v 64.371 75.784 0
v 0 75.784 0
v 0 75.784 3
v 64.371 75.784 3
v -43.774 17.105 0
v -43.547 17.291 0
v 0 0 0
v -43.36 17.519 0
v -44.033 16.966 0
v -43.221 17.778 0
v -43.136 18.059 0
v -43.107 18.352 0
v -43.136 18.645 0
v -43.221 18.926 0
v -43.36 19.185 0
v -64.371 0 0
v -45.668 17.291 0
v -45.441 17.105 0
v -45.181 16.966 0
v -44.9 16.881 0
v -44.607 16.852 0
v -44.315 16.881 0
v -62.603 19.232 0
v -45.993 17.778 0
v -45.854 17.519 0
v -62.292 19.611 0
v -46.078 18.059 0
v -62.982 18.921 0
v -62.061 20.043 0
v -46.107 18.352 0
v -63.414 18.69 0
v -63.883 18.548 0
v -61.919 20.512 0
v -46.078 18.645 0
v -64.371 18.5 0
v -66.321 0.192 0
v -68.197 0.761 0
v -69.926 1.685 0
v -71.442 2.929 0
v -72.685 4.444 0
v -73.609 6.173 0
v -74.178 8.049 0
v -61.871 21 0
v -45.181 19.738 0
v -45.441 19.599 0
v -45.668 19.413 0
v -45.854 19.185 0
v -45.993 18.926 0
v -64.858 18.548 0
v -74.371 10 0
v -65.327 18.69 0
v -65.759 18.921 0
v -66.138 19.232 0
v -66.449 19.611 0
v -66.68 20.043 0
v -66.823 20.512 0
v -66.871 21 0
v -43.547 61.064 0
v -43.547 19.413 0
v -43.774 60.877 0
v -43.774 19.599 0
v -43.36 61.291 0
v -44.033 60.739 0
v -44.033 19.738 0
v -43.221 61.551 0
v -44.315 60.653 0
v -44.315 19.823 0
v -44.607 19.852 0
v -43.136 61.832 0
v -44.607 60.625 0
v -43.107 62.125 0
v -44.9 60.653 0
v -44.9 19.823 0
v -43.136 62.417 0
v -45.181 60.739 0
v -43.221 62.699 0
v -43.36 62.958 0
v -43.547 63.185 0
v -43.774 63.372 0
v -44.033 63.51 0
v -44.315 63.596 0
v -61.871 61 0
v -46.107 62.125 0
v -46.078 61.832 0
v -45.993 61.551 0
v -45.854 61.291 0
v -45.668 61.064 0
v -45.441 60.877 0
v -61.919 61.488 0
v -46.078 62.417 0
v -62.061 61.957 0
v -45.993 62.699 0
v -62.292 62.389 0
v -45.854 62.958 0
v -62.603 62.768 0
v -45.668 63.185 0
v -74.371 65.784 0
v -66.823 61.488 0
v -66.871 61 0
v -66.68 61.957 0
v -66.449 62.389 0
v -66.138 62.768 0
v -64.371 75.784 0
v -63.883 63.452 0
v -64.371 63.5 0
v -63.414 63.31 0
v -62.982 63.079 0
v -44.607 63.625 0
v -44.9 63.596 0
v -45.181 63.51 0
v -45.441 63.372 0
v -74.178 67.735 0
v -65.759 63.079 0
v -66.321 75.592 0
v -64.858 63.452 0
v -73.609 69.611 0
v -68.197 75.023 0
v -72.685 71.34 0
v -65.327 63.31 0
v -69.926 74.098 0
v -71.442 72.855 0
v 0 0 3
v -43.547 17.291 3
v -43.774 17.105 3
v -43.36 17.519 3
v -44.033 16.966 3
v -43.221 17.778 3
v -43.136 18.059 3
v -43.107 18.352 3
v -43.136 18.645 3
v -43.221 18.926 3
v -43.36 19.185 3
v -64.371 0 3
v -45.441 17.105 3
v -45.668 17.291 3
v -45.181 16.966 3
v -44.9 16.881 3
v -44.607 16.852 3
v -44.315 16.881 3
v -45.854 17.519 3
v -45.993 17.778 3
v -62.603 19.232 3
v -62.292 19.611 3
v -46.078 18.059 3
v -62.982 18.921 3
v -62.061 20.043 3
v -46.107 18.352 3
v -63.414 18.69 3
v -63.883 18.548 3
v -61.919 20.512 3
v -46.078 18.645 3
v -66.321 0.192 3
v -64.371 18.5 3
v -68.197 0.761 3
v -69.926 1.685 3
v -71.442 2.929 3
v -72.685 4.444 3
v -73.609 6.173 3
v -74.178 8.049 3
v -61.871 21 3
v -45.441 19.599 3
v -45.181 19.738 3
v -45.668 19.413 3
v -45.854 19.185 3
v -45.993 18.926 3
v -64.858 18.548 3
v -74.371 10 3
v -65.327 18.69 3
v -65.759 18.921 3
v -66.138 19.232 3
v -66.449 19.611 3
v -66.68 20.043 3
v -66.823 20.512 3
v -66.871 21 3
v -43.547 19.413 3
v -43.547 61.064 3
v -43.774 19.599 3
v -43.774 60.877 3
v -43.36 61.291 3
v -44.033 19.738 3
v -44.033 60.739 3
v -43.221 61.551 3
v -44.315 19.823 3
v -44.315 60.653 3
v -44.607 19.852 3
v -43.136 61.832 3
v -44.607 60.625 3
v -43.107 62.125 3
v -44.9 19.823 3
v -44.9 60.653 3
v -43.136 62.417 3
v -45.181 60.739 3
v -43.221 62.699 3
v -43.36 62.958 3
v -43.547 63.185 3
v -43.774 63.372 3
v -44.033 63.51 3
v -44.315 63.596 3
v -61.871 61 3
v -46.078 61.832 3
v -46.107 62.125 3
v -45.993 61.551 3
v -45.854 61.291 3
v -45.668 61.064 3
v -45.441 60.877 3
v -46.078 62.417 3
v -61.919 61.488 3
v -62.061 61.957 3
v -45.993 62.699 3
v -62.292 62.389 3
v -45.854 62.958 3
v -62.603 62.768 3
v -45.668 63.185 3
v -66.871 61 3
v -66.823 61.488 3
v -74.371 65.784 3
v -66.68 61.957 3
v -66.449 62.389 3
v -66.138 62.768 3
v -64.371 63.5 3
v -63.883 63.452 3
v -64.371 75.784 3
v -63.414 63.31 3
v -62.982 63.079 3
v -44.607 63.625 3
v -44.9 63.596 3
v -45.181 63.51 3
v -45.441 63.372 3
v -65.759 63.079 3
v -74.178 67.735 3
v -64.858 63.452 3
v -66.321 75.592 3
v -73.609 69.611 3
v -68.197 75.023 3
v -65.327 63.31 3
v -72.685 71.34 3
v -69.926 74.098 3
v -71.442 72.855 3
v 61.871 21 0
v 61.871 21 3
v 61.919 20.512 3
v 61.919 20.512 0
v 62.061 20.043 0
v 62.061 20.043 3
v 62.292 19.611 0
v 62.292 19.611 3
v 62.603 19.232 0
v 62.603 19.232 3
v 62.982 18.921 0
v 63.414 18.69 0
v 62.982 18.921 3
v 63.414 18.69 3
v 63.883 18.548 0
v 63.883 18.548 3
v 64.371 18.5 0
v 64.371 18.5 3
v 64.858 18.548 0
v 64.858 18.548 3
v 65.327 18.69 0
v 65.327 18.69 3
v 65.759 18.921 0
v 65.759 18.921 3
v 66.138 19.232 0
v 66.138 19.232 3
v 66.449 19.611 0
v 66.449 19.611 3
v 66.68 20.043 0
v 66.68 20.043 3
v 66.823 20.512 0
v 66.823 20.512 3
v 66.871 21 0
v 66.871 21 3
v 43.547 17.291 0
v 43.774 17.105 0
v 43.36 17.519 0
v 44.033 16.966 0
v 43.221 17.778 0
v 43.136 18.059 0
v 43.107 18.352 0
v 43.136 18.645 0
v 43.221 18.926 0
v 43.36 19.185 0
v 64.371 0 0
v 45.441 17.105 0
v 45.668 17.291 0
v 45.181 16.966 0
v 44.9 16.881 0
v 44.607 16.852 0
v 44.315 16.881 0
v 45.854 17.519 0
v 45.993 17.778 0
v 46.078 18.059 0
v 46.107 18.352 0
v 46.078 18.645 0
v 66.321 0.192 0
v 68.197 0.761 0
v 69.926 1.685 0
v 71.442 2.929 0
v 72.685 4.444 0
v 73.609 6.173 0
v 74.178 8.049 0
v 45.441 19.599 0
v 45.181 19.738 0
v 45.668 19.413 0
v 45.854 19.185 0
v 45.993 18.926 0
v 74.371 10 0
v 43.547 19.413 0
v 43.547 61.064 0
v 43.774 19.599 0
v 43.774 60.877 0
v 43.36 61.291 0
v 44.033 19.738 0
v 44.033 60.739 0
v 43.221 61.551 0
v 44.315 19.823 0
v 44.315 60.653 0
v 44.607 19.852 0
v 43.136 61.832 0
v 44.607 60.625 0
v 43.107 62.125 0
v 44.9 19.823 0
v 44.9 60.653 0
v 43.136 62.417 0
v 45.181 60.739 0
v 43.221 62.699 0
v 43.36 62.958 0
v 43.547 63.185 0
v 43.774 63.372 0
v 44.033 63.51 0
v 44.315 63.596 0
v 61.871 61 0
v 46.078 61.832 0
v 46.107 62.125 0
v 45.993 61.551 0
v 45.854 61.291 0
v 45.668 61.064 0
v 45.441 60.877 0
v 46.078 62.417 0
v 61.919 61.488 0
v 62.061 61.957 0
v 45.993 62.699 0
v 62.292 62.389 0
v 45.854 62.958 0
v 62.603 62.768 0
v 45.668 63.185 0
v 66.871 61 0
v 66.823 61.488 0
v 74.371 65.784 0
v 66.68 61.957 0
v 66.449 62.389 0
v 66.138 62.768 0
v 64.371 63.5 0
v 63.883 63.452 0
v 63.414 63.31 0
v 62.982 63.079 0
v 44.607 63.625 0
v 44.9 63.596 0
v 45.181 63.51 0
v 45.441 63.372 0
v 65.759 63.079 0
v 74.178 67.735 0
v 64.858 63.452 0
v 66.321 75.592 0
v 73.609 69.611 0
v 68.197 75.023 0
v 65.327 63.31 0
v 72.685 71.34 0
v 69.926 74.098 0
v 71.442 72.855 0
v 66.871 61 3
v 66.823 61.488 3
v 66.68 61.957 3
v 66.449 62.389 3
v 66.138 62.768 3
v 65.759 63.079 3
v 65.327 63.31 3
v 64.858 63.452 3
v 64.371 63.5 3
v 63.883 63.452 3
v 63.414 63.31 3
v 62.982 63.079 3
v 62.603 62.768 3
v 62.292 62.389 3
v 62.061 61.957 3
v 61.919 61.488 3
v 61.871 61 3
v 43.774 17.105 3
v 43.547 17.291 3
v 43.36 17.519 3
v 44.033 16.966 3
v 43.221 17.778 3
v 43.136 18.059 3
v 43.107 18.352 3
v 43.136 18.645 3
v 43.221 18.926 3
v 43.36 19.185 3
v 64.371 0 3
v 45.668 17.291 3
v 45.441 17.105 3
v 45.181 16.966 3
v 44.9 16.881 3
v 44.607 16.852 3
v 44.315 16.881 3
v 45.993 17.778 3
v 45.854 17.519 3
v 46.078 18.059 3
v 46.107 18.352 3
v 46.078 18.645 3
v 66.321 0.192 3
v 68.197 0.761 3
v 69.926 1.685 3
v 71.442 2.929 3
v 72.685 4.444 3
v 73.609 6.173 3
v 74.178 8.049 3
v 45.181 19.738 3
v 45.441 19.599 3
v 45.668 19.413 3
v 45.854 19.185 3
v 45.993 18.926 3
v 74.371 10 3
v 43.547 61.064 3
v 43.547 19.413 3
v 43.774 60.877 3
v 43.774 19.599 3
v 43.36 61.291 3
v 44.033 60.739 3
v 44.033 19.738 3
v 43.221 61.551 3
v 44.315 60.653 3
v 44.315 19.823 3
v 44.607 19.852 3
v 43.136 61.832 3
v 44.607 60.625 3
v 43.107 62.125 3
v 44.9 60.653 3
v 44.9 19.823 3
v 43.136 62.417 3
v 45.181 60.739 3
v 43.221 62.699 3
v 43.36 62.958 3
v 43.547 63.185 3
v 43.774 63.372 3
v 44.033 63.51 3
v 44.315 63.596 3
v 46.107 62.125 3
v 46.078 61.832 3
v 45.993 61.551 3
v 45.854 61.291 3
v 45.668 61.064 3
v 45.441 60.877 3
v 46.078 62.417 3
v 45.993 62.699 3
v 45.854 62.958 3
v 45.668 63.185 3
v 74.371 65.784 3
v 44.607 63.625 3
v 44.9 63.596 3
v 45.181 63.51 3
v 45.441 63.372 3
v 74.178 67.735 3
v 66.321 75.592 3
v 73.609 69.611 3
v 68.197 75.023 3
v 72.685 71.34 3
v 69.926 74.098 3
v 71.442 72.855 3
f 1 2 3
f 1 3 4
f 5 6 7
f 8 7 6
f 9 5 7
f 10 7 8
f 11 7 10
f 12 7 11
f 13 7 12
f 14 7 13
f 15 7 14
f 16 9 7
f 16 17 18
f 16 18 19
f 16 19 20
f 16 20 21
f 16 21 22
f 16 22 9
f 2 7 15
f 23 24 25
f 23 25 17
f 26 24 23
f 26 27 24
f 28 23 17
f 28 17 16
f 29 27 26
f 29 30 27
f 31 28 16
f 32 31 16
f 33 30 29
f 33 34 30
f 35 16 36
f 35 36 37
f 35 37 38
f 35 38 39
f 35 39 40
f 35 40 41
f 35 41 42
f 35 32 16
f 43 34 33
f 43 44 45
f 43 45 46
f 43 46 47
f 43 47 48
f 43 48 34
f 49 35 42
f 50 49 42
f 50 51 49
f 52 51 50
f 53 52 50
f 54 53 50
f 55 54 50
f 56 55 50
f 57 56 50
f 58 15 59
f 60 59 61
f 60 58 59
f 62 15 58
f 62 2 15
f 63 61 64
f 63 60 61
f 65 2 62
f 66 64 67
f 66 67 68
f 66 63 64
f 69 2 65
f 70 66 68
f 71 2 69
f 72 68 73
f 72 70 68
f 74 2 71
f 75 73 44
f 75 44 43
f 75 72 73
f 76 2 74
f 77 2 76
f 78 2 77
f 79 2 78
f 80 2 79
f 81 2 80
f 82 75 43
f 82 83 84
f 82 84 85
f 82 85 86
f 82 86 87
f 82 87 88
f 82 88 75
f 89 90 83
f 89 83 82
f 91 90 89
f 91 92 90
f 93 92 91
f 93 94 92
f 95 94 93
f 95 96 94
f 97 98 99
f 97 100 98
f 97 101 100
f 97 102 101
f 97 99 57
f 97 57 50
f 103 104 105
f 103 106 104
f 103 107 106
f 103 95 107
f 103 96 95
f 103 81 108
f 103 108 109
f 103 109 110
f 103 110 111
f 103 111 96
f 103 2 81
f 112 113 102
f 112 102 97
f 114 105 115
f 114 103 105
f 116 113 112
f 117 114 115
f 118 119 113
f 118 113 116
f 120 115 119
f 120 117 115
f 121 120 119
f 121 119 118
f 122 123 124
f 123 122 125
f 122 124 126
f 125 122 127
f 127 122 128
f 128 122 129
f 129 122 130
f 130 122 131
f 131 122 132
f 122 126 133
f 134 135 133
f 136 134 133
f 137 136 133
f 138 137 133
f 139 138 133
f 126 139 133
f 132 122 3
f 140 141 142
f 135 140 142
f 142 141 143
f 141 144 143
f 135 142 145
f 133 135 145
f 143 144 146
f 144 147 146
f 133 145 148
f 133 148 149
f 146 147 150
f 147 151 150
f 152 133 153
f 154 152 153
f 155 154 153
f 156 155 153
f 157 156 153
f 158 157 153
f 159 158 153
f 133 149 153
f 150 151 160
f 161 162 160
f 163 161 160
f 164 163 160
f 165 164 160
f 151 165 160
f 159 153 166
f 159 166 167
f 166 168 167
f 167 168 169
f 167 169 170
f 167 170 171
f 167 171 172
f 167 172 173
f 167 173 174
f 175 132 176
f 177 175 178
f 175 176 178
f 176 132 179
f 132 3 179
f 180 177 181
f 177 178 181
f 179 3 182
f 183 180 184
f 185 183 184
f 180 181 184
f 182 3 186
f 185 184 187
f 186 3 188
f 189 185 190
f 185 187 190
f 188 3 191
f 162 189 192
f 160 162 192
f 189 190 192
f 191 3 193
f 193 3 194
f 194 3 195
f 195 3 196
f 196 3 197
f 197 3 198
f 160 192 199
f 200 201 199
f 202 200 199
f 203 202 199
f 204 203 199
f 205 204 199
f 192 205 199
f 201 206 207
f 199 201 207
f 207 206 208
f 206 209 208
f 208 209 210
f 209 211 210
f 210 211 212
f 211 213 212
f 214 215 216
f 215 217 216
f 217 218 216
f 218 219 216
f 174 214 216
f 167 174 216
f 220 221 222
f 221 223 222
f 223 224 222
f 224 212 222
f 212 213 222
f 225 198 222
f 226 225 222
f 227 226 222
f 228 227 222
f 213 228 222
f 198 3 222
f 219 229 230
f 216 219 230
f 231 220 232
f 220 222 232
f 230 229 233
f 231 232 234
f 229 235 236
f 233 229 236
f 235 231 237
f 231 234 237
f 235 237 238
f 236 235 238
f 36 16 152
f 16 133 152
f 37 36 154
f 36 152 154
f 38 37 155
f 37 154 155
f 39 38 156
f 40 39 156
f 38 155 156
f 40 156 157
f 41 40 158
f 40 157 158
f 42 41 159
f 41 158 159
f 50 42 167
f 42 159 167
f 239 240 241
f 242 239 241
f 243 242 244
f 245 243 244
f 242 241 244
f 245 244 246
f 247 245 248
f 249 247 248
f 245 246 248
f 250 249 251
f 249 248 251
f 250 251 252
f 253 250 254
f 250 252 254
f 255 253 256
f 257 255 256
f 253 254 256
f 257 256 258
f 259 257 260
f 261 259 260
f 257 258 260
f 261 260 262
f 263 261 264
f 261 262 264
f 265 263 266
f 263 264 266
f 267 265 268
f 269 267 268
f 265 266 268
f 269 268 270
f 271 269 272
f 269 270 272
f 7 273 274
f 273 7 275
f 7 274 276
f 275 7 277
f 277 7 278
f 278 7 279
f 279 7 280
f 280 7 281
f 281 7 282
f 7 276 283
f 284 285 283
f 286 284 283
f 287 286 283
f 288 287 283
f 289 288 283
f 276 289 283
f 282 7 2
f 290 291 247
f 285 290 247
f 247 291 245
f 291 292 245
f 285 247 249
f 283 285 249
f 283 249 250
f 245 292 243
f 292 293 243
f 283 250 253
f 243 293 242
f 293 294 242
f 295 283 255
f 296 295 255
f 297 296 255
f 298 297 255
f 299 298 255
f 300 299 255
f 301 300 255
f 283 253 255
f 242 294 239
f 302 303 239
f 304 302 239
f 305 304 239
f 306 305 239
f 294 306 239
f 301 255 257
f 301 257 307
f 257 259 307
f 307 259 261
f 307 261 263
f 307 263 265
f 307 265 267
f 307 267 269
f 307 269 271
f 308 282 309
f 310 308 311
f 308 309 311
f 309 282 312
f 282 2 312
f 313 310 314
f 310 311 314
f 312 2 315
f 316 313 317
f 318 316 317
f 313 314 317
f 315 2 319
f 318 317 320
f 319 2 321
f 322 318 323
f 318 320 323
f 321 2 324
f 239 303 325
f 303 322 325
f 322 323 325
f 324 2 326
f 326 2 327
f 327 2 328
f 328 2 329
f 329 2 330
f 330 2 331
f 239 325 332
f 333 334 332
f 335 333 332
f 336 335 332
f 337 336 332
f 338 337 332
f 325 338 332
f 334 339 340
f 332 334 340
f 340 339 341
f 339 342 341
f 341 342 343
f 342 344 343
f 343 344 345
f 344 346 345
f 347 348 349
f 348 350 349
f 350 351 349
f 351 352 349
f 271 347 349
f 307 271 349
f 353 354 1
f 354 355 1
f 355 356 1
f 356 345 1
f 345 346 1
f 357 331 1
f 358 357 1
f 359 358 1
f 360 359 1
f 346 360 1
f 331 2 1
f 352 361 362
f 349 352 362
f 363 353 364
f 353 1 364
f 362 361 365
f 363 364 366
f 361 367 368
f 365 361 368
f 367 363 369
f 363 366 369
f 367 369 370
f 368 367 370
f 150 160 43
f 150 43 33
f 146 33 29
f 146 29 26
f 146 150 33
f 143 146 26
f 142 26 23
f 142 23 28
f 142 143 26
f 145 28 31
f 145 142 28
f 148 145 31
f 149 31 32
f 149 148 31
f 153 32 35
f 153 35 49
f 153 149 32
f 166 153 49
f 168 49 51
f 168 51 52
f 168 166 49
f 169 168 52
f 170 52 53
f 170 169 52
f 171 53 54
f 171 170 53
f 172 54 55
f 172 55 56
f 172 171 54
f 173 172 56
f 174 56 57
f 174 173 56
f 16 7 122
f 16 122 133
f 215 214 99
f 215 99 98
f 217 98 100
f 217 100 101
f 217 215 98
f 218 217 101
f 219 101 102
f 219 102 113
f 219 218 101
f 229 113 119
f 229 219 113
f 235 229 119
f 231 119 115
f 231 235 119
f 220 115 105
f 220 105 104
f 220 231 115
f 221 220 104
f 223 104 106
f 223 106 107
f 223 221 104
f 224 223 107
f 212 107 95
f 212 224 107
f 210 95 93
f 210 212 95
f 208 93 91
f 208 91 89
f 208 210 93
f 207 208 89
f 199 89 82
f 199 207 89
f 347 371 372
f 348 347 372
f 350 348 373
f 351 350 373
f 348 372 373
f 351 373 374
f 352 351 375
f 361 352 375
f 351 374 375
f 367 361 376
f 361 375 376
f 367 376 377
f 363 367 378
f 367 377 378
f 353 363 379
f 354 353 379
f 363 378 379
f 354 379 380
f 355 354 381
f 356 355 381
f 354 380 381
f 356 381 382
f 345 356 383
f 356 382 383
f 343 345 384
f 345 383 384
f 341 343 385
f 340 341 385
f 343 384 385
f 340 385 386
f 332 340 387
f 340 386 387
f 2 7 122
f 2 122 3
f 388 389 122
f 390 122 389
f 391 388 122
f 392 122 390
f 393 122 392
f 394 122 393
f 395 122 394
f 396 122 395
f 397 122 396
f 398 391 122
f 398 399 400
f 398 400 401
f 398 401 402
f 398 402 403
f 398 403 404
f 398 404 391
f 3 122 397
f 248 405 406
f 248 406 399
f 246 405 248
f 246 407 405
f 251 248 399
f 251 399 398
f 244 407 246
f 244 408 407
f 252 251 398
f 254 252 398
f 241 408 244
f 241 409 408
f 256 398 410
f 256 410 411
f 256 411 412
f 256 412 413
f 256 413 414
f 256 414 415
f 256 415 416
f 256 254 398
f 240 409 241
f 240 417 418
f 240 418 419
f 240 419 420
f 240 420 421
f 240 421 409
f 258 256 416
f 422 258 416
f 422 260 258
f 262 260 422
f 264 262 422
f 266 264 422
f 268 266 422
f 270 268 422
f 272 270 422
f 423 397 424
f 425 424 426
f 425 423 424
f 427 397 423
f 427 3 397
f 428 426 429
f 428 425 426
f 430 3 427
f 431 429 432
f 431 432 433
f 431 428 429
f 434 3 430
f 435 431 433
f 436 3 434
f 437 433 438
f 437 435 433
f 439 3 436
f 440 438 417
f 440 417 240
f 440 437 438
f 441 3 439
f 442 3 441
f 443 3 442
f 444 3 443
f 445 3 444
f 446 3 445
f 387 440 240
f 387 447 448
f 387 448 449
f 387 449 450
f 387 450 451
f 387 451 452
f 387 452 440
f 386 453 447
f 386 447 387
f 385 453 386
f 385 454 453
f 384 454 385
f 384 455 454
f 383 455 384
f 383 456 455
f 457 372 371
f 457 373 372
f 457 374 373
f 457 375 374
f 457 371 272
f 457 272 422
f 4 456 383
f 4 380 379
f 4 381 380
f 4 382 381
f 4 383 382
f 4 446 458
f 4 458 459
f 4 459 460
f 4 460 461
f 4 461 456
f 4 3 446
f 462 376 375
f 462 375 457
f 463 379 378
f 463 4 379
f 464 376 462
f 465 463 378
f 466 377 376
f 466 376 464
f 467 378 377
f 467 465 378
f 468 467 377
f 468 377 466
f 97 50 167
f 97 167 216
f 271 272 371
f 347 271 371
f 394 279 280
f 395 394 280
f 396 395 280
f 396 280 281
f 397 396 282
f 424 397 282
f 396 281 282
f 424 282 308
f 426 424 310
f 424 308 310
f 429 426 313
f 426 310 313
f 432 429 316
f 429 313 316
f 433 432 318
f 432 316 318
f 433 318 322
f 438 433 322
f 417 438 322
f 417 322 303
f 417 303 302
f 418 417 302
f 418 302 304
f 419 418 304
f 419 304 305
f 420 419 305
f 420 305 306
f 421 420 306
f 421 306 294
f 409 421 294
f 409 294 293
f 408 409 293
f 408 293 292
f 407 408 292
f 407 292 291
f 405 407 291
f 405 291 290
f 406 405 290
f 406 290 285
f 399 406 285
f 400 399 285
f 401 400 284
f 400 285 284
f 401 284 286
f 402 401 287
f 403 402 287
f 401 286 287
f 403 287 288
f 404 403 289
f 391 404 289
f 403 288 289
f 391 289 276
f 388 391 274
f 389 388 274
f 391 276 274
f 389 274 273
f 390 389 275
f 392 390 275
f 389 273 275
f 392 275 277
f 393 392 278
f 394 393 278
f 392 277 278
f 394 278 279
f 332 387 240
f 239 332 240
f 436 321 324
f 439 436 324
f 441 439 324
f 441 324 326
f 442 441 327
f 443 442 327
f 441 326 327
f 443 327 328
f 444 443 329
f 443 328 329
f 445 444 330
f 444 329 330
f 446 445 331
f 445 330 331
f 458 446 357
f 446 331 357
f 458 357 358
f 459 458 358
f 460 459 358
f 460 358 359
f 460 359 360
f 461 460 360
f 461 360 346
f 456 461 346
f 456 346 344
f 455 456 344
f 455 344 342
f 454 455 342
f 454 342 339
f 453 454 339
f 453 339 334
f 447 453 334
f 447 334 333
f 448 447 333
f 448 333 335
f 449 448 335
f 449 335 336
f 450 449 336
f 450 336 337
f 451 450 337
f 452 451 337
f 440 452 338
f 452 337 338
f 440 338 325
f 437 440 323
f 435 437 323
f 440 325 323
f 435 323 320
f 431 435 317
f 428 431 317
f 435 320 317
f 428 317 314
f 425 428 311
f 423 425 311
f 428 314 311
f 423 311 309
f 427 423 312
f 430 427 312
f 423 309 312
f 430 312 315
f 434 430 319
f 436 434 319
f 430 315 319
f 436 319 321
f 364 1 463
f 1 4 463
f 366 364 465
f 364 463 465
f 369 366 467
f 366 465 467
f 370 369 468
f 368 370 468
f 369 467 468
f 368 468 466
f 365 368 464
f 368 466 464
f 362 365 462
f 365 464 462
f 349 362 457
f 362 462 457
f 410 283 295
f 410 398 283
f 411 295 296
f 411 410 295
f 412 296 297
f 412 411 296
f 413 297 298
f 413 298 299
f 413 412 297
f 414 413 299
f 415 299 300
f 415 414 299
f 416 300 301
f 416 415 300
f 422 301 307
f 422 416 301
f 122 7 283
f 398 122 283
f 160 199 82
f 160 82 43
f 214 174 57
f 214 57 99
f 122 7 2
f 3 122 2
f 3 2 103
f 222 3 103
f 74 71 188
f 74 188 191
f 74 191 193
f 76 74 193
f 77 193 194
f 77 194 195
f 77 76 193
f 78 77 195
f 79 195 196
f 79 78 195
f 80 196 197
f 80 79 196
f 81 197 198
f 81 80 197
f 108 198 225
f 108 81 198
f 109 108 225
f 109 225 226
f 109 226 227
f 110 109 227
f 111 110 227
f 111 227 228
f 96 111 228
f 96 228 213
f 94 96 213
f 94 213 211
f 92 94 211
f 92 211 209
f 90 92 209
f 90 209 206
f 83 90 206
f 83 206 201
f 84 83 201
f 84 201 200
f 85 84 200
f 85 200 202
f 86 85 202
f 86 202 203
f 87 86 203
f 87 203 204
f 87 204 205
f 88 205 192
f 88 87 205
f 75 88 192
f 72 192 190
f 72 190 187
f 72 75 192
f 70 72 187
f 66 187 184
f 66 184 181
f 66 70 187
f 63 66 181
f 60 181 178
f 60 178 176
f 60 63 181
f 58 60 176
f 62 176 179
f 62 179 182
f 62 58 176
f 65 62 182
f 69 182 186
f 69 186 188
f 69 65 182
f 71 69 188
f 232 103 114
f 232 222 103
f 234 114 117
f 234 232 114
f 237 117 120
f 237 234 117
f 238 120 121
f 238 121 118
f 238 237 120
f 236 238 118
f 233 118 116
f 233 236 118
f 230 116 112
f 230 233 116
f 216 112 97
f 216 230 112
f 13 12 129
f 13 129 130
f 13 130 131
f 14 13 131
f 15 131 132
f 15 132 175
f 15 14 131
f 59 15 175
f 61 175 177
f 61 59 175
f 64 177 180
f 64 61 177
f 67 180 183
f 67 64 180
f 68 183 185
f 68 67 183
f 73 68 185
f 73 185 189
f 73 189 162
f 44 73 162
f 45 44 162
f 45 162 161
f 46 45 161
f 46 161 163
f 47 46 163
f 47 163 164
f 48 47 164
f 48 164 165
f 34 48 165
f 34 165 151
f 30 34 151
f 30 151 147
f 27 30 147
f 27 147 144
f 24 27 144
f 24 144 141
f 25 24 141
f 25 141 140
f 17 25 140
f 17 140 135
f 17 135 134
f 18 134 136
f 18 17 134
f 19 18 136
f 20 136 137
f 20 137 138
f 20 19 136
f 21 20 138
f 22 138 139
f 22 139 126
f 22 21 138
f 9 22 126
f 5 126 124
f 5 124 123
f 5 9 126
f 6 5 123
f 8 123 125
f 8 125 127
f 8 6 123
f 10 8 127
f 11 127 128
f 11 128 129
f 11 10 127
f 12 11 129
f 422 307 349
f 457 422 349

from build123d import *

# Parameters (mm, degrees)
F0_W     = 74.370556
F0_H     = 75.7838
F1_DEPTH = 3
F3_D     = 3
F6_DEPTH = 77.581309
F7_R     = 10


with BuildPart() as f1:
    # F0 (on Top) → F1 (new body)
    with BuildSketch(Plane.XY):
        with Locations((37.185278, 37.8919)):
            Rectangle(F0_W, F0_H)
    extrude(amount=F1_DEPTH)

    # F3 (through all)
    with Locations(Plane.XY.offset(3)):
        with Locations((44.607192, 62.124677), (44.607192, 18.351912)):
            Hole(F3_D / 2)

    # F5 (on face) → F6 (cut)
    with BuildSketch(Plane.XY.offset(3)):
        with BuildLine():
            ThreePointArc((61.870556, 21), (64.370556, 18.5), (66.870556, 21))
            Line((66.870556, 21), (66.870556, 61))
            ThreePointArc((66.870556, 61), (64.370556, 63.5), (61.870556, 61))
            Line((61.870556, 61), (61.870556, 21))
        make_face()
    extrude(amount=-F6_DEPTH, mode=Mode.SUBTRACT)

    # F7
    f7_edges = [f1.edges().sort_by_distance(p)[0] for p in [
        (74.370556, 0, 1.5),
        (74.370556, 75.7838, 1.5),
    ]]
    fillet(f7_edges, radius=F7_R)


with BuildPart() as f8_1:
    # F8: instance of F1
    add(f1.part.mirror(Plane.YZ))


solid = Compound([f1.part, f8_1.part])
